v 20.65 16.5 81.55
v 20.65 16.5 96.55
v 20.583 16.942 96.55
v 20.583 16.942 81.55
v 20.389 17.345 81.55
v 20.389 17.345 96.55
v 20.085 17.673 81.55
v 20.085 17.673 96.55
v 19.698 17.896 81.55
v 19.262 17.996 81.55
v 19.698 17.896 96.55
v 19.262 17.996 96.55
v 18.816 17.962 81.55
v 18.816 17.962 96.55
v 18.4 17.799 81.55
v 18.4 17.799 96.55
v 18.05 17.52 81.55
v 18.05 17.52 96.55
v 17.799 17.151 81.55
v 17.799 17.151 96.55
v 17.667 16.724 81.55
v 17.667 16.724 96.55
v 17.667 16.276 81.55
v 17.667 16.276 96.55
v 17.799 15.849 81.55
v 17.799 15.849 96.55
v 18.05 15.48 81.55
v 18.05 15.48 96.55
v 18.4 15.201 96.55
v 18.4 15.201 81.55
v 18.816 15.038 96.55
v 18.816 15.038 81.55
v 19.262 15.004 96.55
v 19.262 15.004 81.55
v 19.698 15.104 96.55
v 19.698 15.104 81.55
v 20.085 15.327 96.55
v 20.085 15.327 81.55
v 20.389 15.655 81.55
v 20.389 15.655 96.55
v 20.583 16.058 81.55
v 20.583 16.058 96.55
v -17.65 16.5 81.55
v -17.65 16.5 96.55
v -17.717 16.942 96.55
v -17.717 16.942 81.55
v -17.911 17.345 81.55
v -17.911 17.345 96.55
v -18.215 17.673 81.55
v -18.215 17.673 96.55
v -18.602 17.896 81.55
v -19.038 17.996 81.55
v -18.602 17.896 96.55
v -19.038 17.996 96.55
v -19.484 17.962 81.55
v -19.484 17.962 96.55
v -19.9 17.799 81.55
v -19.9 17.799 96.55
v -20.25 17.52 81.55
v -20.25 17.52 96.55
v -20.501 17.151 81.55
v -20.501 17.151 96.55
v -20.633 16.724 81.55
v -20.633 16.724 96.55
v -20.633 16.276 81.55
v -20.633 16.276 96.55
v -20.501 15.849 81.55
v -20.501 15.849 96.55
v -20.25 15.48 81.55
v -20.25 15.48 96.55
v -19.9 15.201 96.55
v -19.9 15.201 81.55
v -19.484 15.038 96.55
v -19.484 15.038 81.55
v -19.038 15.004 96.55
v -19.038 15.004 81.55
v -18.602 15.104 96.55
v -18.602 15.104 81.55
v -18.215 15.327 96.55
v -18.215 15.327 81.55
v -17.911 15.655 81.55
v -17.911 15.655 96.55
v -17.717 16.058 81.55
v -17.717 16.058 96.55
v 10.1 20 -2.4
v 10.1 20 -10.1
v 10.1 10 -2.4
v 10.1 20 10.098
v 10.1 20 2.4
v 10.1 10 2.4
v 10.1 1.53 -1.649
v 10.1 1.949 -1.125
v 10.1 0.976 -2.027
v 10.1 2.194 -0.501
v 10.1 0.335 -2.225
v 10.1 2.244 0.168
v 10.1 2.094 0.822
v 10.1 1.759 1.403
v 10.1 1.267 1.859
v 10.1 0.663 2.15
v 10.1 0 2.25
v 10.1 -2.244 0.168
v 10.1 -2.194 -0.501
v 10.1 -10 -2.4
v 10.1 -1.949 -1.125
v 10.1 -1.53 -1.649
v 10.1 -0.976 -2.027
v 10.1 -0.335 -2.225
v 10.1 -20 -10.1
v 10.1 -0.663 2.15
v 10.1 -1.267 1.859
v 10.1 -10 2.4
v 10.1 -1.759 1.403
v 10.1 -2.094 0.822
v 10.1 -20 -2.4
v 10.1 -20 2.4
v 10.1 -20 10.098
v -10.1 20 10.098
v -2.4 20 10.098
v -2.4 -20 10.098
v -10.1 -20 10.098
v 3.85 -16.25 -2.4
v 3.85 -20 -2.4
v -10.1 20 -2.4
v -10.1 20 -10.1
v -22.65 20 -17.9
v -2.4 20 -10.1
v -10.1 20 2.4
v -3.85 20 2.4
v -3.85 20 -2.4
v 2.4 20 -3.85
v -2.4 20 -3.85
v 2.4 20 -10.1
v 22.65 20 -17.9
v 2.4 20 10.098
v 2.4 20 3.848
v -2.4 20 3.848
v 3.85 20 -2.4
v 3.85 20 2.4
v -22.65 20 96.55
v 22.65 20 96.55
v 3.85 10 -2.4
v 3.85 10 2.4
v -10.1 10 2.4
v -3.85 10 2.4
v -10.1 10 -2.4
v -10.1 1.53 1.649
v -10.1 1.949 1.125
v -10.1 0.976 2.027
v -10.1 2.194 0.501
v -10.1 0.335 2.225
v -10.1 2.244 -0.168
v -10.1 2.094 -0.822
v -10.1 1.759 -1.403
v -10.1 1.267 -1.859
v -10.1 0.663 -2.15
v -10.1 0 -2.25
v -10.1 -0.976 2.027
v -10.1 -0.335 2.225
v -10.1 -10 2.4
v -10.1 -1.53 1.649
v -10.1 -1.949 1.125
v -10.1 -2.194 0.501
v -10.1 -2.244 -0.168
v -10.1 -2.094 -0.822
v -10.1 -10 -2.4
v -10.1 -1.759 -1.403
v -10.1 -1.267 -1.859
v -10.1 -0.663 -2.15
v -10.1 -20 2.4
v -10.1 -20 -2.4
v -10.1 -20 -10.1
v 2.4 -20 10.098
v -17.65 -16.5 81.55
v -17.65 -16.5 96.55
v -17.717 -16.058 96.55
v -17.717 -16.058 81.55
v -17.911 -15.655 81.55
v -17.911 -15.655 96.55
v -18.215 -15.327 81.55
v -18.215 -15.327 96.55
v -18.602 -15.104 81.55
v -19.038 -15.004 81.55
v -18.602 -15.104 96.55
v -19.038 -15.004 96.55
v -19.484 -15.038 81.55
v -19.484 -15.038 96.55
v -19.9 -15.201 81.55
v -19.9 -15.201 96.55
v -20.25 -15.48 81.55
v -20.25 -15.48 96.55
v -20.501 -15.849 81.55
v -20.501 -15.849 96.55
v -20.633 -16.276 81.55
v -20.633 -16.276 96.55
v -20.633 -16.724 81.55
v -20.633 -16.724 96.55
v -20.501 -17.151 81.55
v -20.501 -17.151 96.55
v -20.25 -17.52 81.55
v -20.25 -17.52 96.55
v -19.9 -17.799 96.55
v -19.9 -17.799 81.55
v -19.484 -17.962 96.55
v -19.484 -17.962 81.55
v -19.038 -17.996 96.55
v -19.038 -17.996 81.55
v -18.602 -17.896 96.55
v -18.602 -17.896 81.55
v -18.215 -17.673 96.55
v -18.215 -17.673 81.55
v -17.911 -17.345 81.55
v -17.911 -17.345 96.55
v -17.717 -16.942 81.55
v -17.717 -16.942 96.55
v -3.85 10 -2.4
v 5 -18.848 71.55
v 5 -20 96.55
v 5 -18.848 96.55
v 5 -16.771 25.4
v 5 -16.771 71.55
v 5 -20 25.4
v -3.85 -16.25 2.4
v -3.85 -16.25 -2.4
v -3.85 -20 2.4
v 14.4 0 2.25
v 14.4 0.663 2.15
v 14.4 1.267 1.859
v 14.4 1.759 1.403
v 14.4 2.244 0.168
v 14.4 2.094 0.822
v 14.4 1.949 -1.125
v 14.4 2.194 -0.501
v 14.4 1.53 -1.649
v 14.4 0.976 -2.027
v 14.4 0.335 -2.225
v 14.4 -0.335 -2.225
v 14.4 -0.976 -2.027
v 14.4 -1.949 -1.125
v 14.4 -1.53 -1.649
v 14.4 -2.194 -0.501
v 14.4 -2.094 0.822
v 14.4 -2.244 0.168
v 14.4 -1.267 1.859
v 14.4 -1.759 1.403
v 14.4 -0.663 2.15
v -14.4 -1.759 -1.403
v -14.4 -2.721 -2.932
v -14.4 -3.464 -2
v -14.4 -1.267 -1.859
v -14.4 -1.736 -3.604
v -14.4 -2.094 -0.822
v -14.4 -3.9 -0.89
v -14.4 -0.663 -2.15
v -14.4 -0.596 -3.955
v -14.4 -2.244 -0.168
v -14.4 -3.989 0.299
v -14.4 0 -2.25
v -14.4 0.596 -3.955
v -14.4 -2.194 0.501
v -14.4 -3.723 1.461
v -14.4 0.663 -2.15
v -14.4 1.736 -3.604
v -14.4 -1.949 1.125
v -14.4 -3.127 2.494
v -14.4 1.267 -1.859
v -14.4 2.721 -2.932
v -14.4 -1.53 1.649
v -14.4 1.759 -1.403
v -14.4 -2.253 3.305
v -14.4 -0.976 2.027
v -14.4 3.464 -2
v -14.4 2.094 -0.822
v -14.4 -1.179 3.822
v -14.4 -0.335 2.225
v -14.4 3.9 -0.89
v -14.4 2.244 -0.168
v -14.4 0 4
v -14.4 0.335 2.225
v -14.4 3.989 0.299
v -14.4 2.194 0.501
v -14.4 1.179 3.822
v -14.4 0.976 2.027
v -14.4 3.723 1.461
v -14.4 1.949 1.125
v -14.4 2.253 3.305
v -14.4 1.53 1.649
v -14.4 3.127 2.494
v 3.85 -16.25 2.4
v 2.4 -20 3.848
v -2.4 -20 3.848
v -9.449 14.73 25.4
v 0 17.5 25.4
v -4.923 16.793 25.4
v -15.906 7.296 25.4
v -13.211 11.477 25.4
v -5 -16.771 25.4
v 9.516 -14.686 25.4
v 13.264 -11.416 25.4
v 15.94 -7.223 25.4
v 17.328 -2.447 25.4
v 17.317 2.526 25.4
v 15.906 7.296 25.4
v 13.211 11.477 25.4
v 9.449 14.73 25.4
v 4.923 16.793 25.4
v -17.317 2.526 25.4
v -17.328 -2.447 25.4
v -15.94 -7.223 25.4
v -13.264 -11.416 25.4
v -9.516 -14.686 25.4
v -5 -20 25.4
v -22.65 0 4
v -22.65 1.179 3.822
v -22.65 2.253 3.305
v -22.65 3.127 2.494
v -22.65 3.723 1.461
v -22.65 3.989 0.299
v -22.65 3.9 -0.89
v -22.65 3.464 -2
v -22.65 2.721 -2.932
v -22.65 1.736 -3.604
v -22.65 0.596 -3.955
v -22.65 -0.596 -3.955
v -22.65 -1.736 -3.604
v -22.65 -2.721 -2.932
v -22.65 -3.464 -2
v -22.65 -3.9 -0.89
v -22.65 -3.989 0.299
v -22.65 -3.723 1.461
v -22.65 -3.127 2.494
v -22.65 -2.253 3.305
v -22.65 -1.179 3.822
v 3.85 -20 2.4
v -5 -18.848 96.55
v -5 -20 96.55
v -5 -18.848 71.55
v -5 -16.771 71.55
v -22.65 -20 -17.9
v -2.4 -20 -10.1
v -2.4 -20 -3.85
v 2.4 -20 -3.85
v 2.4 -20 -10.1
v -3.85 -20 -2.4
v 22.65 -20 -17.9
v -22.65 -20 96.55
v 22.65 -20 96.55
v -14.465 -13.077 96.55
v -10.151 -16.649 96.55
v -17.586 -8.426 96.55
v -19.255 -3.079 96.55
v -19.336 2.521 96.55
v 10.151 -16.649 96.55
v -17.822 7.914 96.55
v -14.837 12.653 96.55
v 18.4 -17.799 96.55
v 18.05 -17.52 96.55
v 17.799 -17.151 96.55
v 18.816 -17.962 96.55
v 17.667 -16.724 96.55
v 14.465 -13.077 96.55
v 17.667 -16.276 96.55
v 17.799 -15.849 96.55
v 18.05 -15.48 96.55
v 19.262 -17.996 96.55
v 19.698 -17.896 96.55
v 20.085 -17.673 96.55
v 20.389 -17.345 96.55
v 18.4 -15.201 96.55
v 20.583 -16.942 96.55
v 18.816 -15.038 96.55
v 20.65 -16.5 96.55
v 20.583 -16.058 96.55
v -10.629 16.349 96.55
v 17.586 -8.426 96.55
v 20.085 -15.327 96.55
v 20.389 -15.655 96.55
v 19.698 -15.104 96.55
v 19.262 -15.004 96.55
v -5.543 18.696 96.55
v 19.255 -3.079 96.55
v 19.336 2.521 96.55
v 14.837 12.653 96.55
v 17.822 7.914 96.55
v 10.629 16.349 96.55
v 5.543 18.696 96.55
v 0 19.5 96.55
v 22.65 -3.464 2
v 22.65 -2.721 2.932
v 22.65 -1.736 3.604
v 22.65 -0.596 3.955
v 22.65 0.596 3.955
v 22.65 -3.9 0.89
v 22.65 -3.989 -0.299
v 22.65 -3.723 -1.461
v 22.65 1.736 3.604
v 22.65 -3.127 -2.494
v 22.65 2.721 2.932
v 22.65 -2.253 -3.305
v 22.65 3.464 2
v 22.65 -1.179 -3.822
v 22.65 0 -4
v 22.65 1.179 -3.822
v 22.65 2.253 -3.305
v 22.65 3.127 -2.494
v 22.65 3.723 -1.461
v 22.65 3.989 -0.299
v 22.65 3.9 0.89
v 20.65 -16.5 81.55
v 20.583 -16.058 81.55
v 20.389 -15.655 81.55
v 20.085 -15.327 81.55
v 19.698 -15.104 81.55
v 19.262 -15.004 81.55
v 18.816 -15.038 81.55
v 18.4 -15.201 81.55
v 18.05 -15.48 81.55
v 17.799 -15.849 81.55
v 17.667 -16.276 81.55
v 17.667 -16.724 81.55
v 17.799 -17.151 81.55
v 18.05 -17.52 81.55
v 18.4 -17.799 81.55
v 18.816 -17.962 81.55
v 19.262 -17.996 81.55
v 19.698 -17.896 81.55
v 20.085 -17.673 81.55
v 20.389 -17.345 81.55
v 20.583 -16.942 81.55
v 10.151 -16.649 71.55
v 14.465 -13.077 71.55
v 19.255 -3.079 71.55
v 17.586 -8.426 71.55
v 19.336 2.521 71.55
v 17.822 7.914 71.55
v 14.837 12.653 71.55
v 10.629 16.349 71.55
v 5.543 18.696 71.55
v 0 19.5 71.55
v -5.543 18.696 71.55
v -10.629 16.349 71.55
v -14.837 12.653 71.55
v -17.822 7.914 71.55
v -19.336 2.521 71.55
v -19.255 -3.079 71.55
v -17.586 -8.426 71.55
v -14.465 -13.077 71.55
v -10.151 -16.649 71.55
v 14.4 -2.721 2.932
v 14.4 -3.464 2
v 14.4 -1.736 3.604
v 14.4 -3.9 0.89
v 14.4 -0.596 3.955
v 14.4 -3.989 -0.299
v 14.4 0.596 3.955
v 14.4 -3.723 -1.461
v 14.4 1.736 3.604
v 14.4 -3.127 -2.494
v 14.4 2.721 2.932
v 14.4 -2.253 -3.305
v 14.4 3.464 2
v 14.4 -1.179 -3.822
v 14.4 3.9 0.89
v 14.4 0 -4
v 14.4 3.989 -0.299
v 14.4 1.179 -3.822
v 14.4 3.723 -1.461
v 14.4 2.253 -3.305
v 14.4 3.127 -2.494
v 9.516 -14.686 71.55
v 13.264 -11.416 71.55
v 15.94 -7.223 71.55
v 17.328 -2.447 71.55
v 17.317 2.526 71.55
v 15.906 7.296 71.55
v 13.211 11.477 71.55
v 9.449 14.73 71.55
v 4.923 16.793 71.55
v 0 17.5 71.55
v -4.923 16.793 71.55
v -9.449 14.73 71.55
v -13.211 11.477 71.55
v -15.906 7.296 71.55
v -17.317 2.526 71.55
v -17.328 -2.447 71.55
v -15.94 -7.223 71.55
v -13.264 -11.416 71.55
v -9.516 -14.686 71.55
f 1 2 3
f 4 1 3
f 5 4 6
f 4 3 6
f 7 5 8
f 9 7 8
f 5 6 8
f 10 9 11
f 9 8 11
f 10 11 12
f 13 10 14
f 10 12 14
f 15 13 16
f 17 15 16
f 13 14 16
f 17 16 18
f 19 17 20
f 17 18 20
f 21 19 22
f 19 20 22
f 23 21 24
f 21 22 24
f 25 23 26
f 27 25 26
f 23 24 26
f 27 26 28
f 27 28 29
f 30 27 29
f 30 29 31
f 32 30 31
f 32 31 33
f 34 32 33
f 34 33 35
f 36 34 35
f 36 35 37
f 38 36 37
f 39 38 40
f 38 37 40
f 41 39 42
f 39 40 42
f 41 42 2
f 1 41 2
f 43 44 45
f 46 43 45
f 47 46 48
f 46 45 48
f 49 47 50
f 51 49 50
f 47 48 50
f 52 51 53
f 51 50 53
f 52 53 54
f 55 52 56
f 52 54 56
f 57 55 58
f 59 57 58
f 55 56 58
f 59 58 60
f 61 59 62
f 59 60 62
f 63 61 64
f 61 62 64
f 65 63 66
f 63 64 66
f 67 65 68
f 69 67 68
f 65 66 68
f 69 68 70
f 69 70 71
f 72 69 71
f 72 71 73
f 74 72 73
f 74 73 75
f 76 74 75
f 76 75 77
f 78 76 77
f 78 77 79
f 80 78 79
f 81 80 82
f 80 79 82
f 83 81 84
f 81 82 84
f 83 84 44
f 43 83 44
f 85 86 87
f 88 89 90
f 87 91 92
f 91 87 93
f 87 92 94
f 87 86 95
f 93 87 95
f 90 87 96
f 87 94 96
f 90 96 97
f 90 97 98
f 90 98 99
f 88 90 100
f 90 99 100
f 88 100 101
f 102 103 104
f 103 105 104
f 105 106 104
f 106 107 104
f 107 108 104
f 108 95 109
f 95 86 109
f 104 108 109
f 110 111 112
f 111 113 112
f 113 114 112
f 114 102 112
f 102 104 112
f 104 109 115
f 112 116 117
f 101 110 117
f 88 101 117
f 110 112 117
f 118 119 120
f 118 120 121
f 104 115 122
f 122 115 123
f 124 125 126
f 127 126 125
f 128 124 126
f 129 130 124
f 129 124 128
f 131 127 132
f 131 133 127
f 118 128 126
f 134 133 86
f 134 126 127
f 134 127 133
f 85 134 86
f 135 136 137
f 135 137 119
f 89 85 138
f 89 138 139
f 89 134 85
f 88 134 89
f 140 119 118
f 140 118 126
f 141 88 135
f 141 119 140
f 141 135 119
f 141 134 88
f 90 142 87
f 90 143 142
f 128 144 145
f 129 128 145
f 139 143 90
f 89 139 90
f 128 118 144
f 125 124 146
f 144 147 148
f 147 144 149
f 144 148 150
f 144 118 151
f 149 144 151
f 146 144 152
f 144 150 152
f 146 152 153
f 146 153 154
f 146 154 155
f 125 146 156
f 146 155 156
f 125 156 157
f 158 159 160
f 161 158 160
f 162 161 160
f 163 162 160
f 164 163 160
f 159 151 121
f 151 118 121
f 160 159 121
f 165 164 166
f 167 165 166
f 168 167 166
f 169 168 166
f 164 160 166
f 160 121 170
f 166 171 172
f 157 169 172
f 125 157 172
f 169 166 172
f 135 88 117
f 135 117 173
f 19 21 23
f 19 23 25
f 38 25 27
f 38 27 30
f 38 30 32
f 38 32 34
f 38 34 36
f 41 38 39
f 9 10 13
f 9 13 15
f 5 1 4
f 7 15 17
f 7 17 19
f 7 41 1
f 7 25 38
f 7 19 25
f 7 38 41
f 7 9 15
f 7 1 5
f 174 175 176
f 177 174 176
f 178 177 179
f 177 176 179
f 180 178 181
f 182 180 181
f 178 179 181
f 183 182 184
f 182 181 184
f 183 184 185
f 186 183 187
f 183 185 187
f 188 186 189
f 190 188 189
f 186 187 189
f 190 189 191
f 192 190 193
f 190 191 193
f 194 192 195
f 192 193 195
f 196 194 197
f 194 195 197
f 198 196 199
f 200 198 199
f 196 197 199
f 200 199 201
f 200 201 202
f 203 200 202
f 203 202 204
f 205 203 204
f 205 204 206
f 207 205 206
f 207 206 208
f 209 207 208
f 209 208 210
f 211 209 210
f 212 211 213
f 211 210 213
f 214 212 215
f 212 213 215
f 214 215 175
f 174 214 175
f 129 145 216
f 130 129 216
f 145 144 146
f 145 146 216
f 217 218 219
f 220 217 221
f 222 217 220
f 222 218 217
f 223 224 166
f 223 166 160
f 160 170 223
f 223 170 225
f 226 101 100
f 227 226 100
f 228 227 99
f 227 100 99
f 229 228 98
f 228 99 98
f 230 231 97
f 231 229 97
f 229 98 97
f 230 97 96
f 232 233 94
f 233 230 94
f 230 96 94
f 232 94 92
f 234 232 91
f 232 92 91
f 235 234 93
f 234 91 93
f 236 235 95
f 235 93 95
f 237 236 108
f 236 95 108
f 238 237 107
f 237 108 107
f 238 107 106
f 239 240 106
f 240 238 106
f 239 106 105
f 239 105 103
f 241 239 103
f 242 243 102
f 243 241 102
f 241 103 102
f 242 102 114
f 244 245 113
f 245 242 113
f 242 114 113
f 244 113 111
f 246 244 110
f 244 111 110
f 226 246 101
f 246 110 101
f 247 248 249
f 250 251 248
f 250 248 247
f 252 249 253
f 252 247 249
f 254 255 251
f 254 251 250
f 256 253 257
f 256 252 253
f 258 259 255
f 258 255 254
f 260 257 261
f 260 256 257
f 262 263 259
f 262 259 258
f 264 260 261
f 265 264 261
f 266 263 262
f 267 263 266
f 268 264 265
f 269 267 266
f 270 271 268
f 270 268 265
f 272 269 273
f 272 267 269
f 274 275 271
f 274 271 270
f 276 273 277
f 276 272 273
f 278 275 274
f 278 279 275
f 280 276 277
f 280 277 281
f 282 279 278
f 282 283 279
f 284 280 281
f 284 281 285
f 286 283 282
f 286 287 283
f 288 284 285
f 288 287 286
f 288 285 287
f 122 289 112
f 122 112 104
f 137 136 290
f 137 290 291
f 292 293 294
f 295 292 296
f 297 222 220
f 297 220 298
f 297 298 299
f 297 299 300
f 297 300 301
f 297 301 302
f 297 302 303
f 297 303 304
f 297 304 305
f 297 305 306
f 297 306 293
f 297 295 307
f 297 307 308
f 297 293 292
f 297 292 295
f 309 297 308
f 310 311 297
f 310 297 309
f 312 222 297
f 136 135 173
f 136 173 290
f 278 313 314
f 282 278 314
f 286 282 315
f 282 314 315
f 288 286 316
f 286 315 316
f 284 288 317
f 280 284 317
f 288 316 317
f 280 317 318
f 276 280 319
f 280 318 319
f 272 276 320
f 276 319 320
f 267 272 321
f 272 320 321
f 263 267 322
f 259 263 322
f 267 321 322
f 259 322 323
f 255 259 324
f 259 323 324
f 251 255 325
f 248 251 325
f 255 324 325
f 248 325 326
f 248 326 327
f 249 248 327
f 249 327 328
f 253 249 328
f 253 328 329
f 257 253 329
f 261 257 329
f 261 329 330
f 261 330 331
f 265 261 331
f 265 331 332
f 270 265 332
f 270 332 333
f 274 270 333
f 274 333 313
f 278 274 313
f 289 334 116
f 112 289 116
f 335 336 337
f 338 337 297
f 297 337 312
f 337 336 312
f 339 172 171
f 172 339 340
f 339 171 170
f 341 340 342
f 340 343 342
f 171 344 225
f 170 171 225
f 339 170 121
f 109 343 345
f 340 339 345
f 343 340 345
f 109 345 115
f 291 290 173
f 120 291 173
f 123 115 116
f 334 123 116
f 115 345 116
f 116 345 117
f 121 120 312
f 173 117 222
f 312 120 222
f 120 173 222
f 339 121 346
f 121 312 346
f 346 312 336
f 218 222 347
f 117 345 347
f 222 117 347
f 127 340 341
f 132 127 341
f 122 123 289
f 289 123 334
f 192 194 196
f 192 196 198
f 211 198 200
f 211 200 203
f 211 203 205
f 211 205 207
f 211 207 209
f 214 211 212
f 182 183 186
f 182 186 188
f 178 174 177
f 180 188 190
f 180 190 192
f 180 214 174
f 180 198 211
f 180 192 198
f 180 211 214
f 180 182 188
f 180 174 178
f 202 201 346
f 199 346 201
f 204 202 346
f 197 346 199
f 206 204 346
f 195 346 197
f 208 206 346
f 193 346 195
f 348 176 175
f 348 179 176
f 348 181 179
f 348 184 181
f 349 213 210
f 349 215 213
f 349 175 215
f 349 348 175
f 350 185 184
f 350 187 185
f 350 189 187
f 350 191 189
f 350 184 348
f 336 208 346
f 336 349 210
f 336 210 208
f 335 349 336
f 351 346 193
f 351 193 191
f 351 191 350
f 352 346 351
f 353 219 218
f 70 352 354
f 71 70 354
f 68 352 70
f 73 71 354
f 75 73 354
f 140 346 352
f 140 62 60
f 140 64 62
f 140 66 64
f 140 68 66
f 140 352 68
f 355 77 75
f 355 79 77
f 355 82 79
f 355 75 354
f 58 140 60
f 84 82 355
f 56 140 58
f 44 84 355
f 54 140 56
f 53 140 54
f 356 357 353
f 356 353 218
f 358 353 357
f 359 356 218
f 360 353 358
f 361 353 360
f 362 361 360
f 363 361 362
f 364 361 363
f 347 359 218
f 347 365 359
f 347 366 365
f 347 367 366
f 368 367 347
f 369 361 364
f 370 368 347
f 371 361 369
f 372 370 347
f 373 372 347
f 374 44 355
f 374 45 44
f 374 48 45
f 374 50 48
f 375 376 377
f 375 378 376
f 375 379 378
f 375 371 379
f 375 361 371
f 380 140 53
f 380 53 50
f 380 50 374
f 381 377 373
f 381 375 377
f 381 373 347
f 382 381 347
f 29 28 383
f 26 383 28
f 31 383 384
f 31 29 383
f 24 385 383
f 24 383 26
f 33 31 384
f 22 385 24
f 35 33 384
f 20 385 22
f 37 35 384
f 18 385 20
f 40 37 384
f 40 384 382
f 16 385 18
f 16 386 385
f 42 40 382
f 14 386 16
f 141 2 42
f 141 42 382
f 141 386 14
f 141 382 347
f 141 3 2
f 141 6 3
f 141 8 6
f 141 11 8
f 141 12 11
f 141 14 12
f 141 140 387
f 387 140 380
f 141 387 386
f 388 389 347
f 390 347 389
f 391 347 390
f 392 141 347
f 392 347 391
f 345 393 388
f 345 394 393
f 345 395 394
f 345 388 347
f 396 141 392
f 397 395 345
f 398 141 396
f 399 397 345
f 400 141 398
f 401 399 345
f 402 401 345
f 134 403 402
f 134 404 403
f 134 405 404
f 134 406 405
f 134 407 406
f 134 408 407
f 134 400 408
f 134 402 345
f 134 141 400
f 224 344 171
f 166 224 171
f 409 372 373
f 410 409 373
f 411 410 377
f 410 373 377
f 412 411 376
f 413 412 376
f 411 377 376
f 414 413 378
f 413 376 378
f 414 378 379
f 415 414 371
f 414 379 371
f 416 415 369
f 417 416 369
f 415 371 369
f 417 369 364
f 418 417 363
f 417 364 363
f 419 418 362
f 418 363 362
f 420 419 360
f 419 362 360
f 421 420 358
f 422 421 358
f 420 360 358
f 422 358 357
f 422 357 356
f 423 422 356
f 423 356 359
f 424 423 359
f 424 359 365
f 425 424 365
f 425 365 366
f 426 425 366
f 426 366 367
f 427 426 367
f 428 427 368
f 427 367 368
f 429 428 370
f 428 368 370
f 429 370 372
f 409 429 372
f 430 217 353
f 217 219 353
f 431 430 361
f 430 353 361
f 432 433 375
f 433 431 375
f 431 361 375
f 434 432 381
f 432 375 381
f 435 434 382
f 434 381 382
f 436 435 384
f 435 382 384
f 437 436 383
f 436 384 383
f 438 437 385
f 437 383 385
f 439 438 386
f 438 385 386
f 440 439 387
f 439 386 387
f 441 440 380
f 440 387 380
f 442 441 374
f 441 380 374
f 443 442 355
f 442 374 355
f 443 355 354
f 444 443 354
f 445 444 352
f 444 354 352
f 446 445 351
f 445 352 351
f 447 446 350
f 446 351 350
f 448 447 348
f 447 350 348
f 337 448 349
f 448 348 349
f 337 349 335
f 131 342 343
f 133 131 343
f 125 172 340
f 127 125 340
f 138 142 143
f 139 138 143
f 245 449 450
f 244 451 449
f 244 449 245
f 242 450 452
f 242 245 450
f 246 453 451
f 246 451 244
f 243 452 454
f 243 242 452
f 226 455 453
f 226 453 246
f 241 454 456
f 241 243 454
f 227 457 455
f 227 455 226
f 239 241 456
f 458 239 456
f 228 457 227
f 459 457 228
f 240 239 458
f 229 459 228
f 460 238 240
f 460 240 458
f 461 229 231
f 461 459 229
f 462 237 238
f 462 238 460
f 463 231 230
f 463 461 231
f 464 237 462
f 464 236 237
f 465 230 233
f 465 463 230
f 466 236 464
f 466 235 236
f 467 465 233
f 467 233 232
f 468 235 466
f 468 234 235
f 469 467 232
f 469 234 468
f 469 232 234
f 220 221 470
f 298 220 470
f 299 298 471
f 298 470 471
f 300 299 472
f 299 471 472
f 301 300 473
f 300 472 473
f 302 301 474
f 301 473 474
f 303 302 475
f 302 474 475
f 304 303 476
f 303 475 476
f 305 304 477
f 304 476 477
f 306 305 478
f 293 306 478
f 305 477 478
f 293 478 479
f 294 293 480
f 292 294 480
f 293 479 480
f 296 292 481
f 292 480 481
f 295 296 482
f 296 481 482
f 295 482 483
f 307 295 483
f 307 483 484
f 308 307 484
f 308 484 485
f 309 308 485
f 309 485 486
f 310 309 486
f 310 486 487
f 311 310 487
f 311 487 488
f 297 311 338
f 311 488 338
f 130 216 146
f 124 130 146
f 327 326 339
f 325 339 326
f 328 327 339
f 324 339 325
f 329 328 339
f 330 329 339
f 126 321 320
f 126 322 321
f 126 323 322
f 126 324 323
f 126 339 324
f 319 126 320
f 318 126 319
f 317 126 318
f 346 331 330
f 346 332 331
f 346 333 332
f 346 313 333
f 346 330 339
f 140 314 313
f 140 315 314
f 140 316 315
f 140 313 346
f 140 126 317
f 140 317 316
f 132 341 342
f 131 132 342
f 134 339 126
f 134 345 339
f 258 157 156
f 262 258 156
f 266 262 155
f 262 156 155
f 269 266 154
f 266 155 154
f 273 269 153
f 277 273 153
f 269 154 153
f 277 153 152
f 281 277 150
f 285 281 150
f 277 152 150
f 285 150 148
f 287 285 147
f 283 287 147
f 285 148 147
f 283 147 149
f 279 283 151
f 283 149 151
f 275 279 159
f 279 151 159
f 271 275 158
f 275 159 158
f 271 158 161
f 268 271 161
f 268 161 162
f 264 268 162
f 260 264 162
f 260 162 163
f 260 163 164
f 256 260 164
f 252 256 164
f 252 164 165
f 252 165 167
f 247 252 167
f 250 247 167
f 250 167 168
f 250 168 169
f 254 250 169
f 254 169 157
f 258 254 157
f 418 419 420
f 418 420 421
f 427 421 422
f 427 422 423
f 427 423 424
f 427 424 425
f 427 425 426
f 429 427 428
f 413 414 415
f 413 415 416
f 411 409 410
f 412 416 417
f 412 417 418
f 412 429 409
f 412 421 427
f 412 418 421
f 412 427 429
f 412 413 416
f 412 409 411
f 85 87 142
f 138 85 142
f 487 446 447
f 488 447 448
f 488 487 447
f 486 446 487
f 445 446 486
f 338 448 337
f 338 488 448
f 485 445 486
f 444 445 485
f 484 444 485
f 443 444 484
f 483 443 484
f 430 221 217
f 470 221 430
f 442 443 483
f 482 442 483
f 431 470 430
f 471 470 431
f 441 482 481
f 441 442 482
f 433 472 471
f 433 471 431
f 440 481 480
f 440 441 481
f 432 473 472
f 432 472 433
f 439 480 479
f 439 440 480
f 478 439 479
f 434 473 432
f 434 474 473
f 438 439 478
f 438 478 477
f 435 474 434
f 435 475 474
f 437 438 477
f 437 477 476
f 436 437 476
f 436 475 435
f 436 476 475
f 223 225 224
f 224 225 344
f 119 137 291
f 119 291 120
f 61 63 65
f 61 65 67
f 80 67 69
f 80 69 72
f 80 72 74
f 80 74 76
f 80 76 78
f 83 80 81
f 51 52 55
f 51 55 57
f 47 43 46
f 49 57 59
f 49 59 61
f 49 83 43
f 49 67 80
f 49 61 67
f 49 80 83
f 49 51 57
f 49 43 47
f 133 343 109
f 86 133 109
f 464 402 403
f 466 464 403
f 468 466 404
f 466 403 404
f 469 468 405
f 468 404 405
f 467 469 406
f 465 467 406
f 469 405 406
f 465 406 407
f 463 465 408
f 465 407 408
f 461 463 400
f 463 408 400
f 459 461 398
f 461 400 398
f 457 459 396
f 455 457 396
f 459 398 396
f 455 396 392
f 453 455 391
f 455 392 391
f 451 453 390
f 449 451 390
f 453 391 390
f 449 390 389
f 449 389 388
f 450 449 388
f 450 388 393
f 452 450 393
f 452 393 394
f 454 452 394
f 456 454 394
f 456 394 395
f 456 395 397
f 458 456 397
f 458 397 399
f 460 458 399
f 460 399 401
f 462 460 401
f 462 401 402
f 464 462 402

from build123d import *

# Parameters (mm, degrees)
BOSS_EXTRU_1_START                                = -20
BOSS_EXTRU_1_DEPTH                                = 40
ESQUISSE6_W                                       = 20.2
ESQUISSE6_H                                       = 20
ENL_V_MAT_EXTRU_1_DEPTH                           = 3
ESQUISSE14_W                                      = 30.8
ESQUISSE14_H                                      = 2.5
BOSS_EXTRU_3_DEPTH                                = 40
CHANFREIN1_SIZE                                   = 6.25
BOSS_EXTRU_4_DEPTH                                = 40
ESQUISSE21_W                                      = 45.3
ESQUISSE21_H                                      = 40
BOSS_EXTRU_5_DEPTH                                = 81.15
ESQUISSE22_R                                      = 17.5
ENL_V_MAT_EXTRU_2_DEPTH                           = 71.15
ESQUISSE23_W                                      = 10
ESQUISSE23_H                                      = 71.15
ENL_V_MAT_EXTRU_6_DEPTH                           = 6.15
ESQUISSE24_R                                      = 19.5
ENL_V_MAT_EXTRU_7_DEPTH                           = 25
ESQUISSE25_W                                      = 33.3
ESQUISSE25_H                                      = 40
BOSS_EXTRU_6_DEPTH                                = 7.25
CHAMBRAGE_POUR_VIS_SIX_PANS_CREUX_M42_D           = 4.5
CHAMBRAGE_POUR_VIS_SIX_PANS_CREUX_M42_DEPTH       = 12.55
CHAMBRAGE_POUR_VIS_SIX_PANS_CREUX_M42_CBORE_D     = 8
CHAMBRAGE_POUR_VIS_SIX_PANS_CREUX_M42_CBORE_DEPTH = 8.25
ESQUISSE28_W                                      = 33.3
ESQUISSE28_H                                      = 40
BOSS_EXTRU_7_DEPTH                                = 7.25
CHAMBRAGE_POUR_VIS_SIX_PANS_CREUX_M43_D           = 4.5
CHAMBRAGE_POUR_VIS_SIX_PANS_CREUX_M43_CBORE_D     = 8
CHAMBRAGE_POUR_VIS_SIX_PANS_CREUX_M43_CBORE_DEPTH = 8.25
ESQUISSE34_R                                      = 1.5
ENL_V_MAT_EXTRU_8_DEPTH                           = 15


# Read off the part's stored shape, not the designer's step: Boss.-Extru.1
with BuildPart() as part:
    # Boss.-Extru.1 outline → Boss.-Extru.1 (new body)
    with BuildSketch(Plane(origin=(0, 0, 0), x_dir=(1, 0, 0), z_dir=(0, 1, 0)).offset(BOSS_EXTRU_1_START)):
        Polygon((-10.1, -2.4), (-3.85, -2.4), (-3.85, 2.4), (-10.1, 2.4), (-10.1, 10.1), (-2.4, 10.1), (-2.4, 3.85), (2.4, 3.85), (2.4, 10.1), (10.1, 10.1), (10.1, 2.4), (3.85, 2.4), (3.85, -2.4), (10.1, -2.4), (10.1, -15.4), (15.4, -15.4), (15.4, 15.4), (-15.4, 15.4), (-15.4, -15.4), (-10.1, -15.4), align=None)
    extrude(amount=BOSS_EXTRU_1_DEPTH)

    # Esquisse6 → Enlèv. mat.-Extru.1 (cut, symmetric)
    with BuildSketch(Plane.XY):
        Rectangle(ESQUISSE6_W, ESQUISSE6_H)
    extrude(amount=ENL_V_MAT_EXTRU_1_DEPTH, both=True, mode=Mode.SUBTRACT)

    # Esquisse14 → Boss.-Extru.3 (add)
    with BuildSketch(Plane.XZ.offset(20)):
        with Locations((0, -16.65)):
            Rectangle(ESQUISSE14_W, ESQUISSE14_H)
    extrude(amount=-BOSS_EXTRU_3_DEPTH)

    # Chanfrein1
    chanfrein1_edges = [part.edges().sort_by_distance(p)[0] for p in [
        (3.85, -10, 0),
        (-3.85, -10, 0),
    ]]
    chamfer(chanfrein1_edges, length=CHANFREIN1_SIZE - 0.0001)  # a hair under: the kernel refuses the full size

    # Esquisse20 → Boss.-Extru.4 (add)
    with BuildSketch(Plane(origin=(0, 20, 0), x_dir=(1, 0, 0), z_dir=(0, 1, 0))):
        Polygon((-10.1, -15.4), (10.1, -15.4), (10.1, -10.097741972), (2.4, -10.097741972), (2.4, -3.847741972), (-2.4, -3.847741972), (-2.4, -10.097741972), (-10.1, -10.097741972), align=None)
    extrude(amount=-BOSS_EXTRU_4_DEPTH)

    # Esquisse21 → Boss.-Extru.5 (add)
    with BuildSketch(Plane.XY.offset(15.4)):
        Rectangle(ESQUISSE21_W, ESQUISSE21_H)
    extrude(amount=BOSS_EXTRU_5_DEPTH)

    # Esquisse22 → Enlèv. mat.-Extru.2 (cut)
    with BuildSketch(Plane.XY.offset(96.55)):
        Circle(ESQUISSE22_R)
    extrude(amount=-ENL_V_MAT_EXTRU_2_DEPTH, mode=Mode.SUBTRACT)

    # Esquisse23 → Enlèv. mat.-Extru.6 (cut)
    with BuildSketch(Plane(origin=(0, -20, 0), x_dir=(-1, 0, 0), z_dir=(0, -1, 0))):
        with Locations((0, -60.975)):
            Rectangle(ESQUISSE23_W, ESQUISSE23_H)
    extrude(amount=-ENL_V_MAT_EXTRU_6_DEPTH, mode=Mode.SUBTRACT)

    # Esquisse24 → Enlèv. mat.-Extru.7 (cut)
    with BuildSketch(Plane.XY.offset(96.55)):
        Circle(ESQUISSE24_R)
    extrude(amount=-ENL_V_MAT_EXTRU_7_DEPTH, mode=Mode.SUBTRACT)

    # Esquisse25 → Boss.-Extru.6 (add)
    with BuildSketch(Plane(origin=(15.4, 0, 0), x_dir=(0, 0, -1), z_dir=(1, 0, 0))):
        with Locations((1.25, 0)):
            Rectangle(ESQUISSE25_W, ESQUISSE25_H)
    extrude(amount=BOSS_EXTRU_6_DEPTH)

    # Chambrage pour vis à six pans creux M42
    with Locations(Plane(origin=(22.65, 0, 0), x_dir=(0, 0, -1), z_dir=(1, 0, 0))):
        with Locations((0, 0)):
            CounterBoreHole(CHAMBRAGE_POUR_VIS_SIX_PANS_CREUX_M42_D / 2, CHAMBRAGE_POUR_VIS_SIX_PANS_CREUX_M42_CBORE_D / 2, CHAMBRAGE_POUR_VIS_SIX_PANS_CREUX_M42_CBORE_DEPTH, depth=CHAMBRAGE_POUR_VIS_SIX_PANS_CREUX_M42_DEPTH)

    # Esquisse28 → Boss.-Extru.7 (add)
    with BuildSketch(Plane.ZY.offset(15.4)):
        with Locations((-1.25, 0)):
            Rectangle(ESQUISSE28_W, ESQUISSE28_H)
    extrude(amount=BOSS_EXTRU_7_DEPTH)

    # Chambrage pour vis à six pans creux M43 (through all)
    with Locations(Plane.ZY.offset(22.65)):
        with Locations((0, 0)):
            CounterBoreHole(CHAMBRAGE_POUR_VIS_SIX_PANS_CREUX_M43_D / 2, CHAMBRAGE_POUR_VIS_SIX_PANS_CREUX_M43_CBORE_D / 2, CHAMBRAGE_POUR_VIS_SIX_PANS_CREUX_M43_CBORE_DEPTH)

    # Esquisse34 → Enlèv. mat.-Extru.8 (cut)
    with BuildSketch(Plane.XY.offset(96.55)):
        with Locations((-19.15, 16.5)):
            Circle(ESQUISSE34_R)
        with Locations((-19.15, -16.5)):
            Circle(ESQUISSE34_R)
        with Locations((19.15, 16.5)):
            Circle(ESQUISSE34_R)
        with Locations((19.15, -16.5)):
            Circle(ESQUISSE34_R)
    extrude(amount=-ENL_V_MAT_EXTRU_8_DEPTH, mode=Mode.SUBTRACT)


solid = part.part
